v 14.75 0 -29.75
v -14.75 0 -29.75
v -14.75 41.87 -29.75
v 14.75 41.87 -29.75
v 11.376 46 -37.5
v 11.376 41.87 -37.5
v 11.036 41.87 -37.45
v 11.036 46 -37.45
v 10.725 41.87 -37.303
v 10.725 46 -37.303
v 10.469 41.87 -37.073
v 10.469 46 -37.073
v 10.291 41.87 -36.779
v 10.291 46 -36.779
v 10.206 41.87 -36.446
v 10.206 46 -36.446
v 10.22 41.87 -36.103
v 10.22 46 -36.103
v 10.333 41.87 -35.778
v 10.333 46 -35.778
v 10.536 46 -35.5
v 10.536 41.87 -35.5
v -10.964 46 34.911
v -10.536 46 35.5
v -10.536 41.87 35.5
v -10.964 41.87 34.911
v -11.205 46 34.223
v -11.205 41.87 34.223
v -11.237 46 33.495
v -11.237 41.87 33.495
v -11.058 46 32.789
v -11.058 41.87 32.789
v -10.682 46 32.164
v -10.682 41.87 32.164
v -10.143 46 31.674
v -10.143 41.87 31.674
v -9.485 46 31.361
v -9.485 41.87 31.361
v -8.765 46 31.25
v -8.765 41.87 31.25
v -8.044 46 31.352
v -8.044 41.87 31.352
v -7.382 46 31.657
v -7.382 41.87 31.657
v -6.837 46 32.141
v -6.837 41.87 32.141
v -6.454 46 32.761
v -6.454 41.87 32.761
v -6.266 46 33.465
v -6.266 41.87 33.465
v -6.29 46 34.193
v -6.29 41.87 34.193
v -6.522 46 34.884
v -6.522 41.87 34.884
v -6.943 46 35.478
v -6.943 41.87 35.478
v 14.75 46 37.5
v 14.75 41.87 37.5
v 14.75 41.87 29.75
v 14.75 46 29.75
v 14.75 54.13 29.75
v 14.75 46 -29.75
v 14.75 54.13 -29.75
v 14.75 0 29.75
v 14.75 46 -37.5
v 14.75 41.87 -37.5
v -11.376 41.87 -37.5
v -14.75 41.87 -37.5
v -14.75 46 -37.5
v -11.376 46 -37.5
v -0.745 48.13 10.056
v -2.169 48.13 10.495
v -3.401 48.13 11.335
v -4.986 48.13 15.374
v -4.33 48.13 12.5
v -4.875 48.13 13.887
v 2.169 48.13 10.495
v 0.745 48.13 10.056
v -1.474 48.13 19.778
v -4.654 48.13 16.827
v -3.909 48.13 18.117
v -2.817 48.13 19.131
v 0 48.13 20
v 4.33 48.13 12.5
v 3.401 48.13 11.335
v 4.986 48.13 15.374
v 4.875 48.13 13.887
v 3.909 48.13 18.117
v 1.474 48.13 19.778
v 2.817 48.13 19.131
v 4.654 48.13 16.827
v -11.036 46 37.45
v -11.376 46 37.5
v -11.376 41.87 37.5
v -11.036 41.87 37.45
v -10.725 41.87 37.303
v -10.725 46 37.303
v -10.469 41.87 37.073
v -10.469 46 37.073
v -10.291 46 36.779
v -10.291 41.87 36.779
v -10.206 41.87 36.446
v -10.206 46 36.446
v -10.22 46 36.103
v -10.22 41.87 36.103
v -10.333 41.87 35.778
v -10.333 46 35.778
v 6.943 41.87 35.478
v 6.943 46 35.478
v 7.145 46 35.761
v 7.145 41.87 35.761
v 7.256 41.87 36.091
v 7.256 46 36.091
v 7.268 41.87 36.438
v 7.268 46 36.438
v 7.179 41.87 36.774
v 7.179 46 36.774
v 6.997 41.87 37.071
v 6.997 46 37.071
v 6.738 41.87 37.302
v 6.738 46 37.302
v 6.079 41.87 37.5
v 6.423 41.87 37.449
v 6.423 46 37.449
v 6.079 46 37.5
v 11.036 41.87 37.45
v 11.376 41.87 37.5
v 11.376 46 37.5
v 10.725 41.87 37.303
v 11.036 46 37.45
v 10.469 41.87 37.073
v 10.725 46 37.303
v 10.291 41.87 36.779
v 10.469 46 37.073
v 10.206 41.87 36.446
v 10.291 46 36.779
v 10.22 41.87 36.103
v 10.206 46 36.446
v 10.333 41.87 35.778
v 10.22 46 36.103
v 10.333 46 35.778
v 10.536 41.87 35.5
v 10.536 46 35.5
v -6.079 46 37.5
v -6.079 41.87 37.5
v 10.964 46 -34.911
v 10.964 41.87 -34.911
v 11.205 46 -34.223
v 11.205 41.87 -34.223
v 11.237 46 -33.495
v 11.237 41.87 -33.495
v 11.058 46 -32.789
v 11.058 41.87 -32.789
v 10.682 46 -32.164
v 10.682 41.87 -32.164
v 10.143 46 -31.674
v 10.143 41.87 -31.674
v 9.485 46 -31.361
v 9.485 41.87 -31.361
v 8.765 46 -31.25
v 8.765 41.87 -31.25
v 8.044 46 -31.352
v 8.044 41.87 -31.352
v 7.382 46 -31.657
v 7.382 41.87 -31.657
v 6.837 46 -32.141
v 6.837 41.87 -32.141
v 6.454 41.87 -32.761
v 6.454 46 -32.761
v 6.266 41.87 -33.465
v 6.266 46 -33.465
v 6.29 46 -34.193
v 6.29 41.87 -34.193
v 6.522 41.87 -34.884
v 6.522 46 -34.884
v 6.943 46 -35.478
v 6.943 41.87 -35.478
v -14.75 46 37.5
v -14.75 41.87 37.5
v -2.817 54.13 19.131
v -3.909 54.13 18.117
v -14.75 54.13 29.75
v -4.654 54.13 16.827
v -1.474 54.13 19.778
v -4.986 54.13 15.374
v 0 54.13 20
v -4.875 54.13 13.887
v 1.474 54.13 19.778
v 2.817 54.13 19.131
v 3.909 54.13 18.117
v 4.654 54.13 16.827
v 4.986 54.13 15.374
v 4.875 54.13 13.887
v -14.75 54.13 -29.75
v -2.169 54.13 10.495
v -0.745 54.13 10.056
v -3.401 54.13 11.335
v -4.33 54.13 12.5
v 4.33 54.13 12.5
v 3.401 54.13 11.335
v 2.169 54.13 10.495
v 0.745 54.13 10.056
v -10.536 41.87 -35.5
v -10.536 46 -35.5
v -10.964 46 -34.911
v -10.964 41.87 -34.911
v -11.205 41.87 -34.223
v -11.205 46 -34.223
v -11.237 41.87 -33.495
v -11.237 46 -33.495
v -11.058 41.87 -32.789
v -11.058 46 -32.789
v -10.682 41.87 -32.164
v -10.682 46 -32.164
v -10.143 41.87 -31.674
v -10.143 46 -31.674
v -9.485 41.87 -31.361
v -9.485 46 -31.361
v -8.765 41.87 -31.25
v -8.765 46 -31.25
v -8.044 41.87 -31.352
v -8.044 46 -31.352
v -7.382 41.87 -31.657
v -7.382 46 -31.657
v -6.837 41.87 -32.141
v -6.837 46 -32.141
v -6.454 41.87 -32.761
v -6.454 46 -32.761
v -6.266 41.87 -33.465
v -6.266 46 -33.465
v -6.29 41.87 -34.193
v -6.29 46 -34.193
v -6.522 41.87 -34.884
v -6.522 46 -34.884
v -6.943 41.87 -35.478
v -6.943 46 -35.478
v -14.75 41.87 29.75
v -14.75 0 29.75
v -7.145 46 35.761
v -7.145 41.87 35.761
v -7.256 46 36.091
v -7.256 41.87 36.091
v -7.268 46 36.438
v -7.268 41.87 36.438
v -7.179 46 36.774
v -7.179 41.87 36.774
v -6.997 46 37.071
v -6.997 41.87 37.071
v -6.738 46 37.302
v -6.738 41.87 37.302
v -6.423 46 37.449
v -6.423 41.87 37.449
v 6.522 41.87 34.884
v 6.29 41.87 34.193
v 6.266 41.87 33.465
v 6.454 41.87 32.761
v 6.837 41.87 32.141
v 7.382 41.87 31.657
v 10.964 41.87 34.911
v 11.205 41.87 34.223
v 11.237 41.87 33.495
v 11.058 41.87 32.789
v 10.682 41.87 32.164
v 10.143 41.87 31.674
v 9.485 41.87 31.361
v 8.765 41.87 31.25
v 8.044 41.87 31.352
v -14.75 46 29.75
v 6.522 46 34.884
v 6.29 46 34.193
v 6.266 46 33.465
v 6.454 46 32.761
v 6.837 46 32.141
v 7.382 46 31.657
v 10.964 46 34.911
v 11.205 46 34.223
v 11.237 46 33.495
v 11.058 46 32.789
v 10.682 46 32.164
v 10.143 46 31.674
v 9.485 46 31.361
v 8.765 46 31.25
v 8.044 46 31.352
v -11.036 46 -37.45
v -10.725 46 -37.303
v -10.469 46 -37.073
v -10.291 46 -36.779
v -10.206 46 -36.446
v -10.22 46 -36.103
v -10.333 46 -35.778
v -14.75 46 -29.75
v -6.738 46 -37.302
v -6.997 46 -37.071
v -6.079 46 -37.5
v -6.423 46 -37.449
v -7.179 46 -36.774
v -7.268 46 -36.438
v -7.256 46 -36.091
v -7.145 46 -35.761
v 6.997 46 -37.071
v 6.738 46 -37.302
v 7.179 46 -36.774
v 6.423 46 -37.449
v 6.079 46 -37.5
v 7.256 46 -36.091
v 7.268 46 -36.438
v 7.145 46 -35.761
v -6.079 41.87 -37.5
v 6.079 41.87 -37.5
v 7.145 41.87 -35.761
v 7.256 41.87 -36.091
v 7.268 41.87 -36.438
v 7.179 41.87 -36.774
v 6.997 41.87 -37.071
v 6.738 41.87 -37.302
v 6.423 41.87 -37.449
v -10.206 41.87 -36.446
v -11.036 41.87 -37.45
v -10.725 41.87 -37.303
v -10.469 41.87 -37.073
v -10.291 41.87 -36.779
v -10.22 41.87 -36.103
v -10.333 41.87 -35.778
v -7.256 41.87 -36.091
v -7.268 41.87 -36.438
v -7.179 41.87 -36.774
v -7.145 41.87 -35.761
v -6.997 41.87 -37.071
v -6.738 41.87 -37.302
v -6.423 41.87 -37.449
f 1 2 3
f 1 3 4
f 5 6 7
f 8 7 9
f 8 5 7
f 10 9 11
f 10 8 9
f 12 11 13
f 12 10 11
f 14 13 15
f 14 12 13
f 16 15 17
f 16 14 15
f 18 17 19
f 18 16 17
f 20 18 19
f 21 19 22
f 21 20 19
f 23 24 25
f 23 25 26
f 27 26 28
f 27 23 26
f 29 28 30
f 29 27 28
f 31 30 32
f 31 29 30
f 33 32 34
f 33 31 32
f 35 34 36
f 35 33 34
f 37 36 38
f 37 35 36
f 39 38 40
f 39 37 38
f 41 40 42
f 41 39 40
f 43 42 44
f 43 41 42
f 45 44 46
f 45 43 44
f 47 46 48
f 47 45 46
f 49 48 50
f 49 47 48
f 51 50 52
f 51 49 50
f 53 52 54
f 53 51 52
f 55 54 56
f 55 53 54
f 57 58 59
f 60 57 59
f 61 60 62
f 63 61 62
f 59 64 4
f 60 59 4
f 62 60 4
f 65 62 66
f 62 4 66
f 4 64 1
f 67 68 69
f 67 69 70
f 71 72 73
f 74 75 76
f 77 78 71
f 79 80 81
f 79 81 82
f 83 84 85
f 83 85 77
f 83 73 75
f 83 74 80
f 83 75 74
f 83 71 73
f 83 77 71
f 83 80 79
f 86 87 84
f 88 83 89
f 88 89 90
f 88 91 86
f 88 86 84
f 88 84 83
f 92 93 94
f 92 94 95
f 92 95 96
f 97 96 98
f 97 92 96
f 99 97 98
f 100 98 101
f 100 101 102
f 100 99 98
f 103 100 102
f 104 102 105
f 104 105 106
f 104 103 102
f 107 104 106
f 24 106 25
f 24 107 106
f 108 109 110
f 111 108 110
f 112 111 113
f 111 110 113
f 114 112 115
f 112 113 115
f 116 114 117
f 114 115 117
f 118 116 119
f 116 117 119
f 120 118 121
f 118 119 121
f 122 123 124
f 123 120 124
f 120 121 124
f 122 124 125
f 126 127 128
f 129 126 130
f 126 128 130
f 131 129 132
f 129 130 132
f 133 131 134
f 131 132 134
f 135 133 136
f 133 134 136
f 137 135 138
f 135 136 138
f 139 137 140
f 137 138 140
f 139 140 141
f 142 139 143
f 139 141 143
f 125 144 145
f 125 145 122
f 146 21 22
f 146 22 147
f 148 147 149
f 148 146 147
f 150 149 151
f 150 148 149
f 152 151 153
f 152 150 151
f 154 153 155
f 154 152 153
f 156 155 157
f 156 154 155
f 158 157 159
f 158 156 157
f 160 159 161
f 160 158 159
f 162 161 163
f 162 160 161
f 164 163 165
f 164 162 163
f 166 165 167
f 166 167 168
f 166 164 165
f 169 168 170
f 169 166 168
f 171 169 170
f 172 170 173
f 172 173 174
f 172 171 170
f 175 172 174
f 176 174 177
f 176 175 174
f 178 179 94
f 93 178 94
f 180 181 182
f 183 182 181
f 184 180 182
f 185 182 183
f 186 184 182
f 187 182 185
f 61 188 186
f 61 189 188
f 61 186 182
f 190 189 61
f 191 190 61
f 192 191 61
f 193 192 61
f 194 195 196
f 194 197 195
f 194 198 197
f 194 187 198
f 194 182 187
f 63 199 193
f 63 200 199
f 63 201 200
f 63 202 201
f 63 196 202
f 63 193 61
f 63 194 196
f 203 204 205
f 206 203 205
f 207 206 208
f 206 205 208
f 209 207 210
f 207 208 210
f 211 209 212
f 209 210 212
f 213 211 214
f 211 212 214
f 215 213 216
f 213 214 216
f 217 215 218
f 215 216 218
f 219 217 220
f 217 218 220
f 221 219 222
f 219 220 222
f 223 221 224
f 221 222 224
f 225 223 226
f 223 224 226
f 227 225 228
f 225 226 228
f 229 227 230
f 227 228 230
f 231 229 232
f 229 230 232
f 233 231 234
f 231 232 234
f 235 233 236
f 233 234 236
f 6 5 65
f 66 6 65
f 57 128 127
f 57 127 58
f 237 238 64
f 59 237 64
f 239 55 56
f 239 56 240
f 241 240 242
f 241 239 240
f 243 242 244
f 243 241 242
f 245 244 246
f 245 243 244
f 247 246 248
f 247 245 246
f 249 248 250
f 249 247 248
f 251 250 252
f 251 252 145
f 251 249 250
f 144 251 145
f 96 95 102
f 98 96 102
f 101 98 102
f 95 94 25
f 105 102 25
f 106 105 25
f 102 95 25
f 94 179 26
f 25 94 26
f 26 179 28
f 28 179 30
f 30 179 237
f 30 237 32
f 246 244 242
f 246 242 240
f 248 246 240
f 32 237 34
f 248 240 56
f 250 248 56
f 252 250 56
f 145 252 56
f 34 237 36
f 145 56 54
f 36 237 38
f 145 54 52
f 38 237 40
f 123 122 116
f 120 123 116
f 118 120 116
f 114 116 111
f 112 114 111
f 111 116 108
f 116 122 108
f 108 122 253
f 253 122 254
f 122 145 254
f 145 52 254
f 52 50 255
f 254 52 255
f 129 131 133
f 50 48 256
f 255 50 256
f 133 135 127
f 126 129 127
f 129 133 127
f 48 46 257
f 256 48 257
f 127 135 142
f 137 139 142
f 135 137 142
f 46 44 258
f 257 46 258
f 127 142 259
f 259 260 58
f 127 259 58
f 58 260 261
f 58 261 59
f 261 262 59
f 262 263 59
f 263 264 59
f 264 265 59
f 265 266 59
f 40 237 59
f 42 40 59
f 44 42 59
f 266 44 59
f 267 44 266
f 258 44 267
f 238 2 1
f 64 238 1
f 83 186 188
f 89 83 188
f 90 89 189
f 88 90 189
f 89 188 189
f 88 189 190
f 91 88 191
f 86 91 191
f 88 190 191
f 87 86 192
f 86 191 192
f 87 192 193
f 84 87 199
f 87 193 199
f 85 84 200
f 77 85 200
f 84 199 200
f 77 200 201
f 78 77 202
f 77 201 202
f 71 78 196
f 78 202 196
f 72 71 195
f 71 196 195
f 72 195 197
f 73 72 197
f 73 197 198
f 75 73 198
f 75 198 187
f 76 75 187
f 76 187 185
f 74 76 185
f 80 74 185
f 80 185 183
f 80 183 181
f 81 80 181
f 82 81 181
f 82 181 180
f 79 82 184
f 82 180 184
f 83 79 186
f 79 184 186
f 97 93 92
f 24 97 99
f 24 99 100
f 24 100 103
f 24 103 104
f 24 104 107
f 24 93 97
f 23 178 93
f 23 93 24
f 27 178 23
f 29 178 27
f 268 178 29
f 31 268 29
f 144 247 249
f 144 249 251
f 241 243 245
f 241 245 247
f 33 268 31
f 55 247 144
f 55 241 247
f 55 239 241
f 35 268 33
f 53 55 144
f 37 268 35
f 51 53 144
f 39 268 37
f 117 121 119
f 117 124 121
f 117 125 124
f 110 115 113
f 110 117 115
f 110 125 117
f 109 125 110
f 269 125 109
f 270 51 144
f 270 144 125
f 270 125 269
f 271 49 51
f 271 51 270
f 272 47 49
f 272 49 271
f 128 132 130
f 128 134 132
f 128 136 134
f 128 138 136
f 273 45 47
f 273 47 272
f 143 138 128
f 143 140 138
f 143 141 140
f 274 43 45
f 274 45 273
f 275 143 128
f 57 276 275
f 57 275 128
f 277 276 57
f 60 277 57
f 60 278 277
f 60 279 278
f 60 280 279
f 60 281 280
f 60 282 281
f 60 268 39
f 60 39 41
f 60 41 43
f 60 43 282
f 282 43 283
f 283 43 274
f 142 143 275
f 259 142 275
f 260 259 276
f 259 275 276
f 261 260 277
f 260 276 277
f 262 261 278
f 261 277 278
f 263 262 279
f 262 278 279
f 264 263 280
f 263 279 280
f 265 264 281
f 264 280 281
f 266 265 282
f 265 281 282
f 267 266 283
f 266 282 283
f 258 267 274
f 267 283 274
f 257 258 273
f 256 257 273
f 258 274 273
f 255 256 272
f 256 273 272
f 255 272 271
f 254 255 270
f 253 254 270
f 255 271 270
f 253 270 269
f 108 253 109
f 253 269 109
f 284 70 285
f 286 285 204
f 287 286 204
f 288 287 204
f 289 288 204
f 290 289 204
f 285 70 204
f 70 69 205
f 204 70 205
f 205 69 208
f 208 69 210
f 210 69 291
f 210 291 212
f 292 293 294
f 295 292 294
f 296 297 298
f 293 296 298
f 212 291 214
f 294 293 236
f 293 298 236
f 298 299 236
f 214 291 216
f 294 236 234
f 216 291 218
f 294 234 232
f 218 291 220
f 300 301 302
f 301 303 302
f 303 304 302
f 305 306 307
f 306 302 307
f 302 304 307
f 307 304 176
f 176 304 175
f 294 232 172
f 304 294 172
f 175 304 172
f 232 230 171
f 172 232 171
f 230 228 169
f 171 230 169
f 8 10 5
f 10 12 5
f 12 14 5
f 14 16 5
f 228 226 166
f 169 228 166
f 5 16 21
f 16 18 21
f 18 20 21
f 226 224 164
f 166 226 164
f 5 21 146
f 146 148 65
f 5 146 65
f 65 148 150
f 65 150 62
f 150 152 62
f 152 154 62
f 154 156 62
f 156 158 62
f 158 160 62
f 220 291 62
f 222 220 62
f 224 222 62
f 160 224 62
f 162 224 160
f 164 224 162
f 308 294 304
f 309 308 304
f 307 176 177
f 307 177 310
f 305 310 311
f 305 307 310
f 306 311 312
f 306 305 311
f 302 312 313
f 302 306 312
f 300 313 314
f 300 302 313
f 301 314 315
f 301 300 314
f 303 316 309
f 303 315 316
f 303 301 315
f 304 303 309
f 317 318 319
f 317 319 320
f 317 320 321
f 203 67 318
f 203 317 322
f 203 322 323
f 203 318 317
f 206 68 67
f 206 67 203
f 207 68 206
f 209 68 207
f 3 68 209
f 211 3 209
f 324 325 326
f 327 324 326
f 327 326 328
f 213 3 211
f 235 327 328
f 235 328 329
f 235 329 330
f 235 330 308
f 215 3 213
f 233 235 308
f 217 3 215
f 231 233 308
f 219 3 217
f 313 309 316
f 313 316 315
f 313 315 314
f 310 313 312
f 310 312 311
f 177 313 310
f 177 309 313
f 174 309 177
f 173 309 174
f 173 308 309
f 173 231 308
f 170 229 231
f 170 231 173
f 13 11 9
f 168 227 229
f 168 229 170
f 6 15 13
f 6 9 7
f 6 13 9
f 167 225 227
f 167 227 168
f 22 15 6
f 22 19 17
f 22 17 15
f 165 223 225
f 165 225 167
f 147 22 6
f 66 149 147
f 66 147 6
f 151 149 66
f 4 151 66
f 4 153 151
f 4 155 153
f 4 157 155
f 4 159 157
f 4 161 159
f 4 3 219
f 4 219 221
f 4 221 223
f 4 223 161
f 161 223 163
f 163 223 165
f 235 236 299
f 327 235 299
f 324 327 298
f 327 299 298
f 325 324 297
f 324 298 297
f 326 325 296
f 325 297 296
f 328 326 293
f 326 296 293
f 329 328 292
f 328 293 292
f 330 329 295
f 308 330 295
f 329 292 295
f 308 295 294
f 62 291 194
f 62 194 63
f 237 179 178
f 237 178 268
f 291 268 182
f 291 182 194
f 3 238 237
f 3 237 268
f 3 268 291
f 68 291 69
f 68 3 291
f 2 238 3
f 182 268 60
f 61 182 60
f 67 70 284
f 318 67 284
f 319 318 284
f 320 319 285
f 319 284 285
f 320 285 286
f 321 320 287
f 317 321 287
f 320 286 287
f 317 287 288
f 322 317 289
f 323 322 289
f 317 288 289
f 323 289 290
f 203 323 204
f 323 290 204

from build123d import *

# Parameters (mm, degrees)
SKETCH1_W           = 29.5
SKETCH1_H           = 59.5
BOSS_EXTRUDE1_DEPTH = 54.13
SKETCH2_W           = 29.5
SKETCH2_H           = 4.13
BOSS_EXTRUDE2_DEPTH = 7.75
CUT_EXTRUDE1_REACH  = 63.154
SKETCH4_R           = 5
CUT_EXTRUDE2_DEPTH  = 6


with BuildPart() as part:
    # Sketch1 → Boss-Extrude1 (new body)
    with BuildSketch(Plane(origin=(0, 0, 0), x_dir=(1, 0, 0), z_dir=(0, 1, 0))):
        Rectangle(SKETCH1_W, SKETCH1_H)
    extrude(amount=BOSS_EXTRUDE1_DEPTH)

    # Sketch2 → Boss-Extrude2 (add)
    with BuildSketch(Plane.XY.offset(29.75)):
        with Locations((0, 43.935)):
            Rectangle(SKETCH2_W, SKETCH2_H)
    boss_extrude2 = extrude(amount=BOSS_EXTRUDE2_DEPTH)

    # Sketch3 → Cut-Extrude1 (cut, up to next)
    with BuildSketch(Plane(origin=(0, 46, 0), x_dir=(1, 0, 0), z_dir=(0, 1, 0)), mode=Mode.PRIVATE) as cut_extrude1_sk1:
        with BuildLine():
            Line((6.079499649, -37.5), (11.375967158, -37.5))
            ThreePointArc((11.375967158, -37.5), (10.291171064, -36.779125945), (10.535567481, -35.49978535))
            ThreePointArc((10.535567481, -35.49978535), (8.765101817, -31.250045613), (6.943423266, -35.478085792))
            ThreePointArc((6.943423266, -35.478085792), (7.178874595, -36.774215218), (6.079499649, -37.5))
        make_face()
    cut_extrude1_tool1 = extrude(cut_extrude1_sk1.sketch, amount=-CUT_EXTRUDE1_REACH, mode=Mode.PRIVATE) & part.part
    # Sketch3 → Cut-Extrude1 (cut, up to next)
    with BuildSketch(Plane(origin=(0, 46, 0), x_dir=(1, 0, 0), z_dir=(0, 1, 0)), mode=Mode.PRIVATE) as cut_extrude1_sk2:
        with BuildLine():
            Line((-6.079499649, -37.5), (-11.375967158, -37.5))
            ThreePointArc((-11.375967158, -37.5), (-10.291171064, -36.779125945), (-10.535567481, -35.49978535))
            ThreePointArc((-10.535567481, -35.49978535), (-8.765101817, -31.250045613), (-6.943423266, -35.478085792))
            ThreePointArc((-6.943423266, -35.478085792), (-7.178874595, -36.774215218), (-6.079499649, -37.5))
        make_face()
    cut_extrude1_tool2 = extrude(cut_extrude1_sk2.sketch, amount=-CUT_EXTRUDE1_REACH, mode=Mode.PRIVATE) & part.part
    cut_extrude1_1 = cut_extrude1_tool1.solids().sort_by_distance((8.746301, 46, 34.352944))[0]
    add(cut_extrude1_1, mode=Mode.SUBTRACT)
    cut_extrude1_2 = cut_extrude1_tool2.solids().sort_by_distance((-8.746301, 46, 34.352944))[0]
    add(cut_extrude1_2, mode=Mode.SUBTRACT)
    cut_extrude1 = cut_extrude1_1 + cut_extrude1_2  # Cut-Extrude1 as one shape, for the pattern or mirror that repeats it

    # Mirror2: Boss-Extrude2, Cut-Extrude1 across plane
    add(boss_extrude2.mirror(Plane.XY))
    add(cut_extrude1.mirror(Plane.XY), mode=Mode.SUBTRACT)

    # Sketch4 → Cut-Extrude2 (cut)
    with BuildSketch(Plane(origin=(0, 54.13, 0), x_dir=(1, 0, 0), z_dir=(0, 1, 0))):
        with Locations(Location((0, -15, 0), (0, 0, 270))):
            Circle(SKETCH4_R)
    extrude(amount=-CUT_EXTRUDE2_DEPTH, mode=Mode.SUBTRACT)


solid = part.part
